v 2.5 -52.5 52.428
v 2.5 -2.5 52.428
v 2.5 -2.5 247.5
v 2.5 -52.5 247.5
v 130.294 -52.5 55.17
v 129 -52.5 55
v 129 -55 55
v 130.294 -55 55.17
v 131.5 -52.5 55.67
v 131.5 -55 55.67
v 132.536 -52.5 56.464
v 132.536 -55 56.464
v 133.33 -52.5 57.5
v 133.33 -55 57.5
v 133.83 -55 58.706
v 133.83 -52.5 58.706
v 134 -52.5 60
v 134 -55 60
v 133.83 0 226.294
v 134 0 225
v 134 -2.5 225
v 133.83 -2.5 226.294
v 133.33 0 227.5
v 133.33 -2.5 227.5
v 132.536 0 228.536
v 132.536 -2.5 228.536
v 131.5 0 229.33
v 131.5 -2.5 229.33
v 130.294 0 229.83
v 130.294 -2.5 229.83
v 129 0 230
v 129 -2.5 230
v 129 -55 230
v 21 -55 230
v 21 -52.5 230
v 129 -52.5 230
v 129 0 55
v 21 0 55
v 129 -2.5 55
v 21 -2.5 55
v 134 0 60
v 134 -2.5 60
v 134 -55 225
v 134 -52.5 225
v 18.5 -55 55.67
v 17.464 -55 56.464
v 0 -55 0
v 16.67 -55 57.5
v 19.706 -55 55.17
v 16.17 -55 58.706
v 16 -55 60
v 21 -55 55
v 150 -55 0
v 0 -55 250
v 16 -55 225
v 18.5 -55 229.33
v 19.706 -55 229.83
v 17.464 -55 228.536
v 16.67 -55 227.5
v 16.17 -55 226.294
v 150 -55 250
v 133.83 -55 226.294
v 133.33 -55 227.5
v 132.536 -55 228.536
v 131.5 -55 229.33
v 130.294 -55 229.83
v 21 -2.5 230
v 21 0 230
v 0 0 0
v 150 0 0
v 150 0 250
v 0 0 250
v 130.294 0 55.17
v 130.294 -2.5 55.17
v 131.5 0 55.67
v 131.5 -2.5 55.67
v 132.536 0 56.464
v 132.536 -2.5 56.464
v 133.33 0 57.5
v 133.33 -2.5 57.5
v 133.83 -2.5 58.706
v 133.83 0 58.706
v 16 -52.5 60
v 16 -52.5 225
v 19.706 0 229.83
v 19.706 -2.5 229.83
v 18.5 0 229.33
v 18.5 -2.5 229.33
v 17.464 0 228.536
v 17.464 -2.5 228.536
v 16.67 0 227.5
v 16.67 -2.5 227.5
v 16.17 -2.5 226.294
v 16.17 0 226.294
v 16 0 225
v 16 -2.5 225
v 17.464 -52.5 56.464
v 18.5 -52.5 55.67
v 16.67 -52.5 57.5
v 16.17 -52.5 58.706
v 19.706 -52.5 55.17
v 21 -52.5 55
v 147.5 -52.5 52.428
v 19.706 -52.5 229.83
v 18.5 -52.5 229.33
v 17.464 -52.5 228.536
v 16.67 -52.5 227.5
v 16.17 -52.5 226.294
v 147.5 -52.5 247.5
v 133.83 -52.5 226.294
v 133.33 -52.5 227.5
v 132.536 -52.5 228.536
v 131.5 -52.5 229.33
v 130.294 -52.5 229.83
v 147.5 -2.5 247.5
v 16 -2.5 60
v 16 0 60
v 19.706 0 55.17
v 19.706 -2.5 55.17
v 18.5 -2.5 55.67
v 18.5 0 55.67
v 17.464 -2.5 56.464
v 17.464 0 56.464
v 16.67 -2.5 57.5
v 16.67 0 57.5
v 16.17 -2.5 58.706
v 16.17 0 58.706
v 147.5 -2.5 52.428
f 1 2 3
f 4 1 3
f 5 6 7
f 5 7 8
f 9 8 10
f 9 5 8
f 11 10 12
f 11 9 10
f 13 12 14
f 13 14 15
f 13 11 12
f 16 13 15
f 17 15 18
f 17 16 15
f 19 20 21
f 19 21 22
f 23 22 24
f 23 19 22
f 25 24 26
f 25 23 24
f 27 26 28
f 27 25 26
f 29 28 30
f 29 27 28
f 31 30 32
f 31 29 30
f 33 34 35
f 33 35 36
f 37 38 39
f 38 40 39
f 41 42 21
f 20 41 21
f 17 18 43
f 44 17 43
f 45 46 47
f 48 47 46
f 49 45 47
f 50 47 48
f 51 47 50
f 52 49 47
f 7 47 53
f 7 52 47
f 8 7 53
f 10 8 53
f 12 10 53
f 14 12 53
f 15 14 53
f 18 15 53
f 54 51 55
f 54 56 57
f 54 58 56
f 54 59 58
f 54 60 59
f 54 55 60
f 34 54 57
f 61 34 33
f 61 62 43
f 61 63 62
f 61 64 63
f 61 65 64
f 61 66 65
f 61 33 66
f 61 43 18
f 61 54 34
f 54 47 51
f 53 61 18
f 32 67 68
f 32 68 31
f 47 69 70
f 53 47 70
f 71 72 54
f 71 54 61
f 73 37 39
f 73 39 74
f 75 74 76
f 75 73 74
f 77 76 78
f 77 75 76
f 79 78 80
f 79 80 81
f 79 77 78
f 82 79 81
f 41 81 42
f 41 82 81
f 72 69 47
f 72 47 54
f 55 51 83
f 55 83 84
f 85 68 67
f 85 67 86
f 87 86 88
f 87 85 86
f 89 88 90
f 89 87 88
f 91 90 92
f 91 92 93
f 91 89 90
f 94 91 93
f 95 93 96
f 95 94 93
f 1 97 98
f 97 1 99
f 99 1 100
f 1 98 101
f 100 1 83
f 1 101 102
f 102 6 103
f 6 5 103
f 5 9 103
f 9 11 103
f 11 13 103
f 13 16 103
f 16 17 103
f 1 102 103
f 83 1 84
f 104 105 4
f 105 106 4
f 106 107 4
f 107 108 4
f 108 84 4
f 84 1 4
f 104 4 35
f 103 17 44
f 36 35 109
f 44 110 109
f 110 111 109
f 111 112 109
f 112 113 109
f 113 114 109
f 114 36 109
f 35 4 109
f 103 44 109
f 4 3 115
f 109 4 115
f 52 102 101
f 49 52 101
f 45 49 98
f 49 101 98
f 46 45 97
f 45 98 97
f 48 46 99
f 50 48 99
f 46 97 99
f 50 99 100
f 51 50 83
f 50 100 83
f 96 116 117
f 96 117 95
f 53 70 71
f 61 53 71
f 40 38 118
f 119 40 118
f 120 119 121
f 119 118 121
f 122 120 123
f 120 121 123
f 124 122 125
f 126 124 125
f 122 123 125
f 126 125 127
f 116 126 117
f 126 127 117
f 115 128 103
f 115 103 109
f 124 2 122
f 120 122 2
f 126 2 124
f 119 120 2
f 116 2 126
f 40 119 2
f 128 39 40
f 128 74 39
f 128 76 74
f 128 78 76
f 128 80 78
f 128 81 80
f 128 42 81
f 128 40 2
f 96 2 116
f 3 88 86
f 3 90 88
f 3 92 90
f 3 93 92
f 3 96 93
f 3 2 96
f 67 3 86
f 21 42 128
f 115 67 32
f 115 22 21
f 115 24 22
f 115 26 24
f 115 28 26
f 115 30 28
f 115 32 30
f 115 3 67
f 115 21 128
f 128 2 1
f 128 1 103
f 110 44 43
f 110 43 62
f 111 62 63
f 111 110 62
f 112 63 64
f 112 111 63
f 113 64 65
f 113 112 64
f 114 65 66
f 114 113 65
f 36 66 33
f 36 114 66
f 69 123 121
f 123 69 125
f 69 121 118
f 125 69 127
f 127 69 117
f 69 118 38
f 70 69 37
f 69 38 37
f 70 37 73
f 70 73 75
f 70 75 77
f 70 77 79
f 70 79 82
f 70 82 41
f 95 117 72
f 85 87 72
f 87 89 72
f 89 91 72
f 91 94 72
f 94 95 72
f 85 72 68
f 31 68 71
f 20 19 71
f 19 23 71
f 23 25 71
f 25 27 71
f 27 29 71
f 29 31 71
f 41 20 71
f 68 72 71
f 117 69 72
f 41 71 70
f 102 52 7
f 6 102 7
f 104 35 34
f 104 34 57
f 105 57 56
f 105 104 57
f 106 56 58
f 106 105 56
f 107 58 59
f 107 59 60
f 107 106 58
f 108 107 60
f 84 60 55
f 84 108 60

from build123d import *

# Parameters (mm, degrees)
F0_W     = 150
F0_H     = 250
F1_DEPTH = 55
F2_W     = 118
F2_H     = 175
F3_DEPTH = 55.001
F4_R     = 5
F5_T     = -2.5
F6_W     = 145
F6_H     = 49.9277314544
F7_DEPTH = 50


with BuildPart() as f1:
    # F0 (on Front) → F1 (new body)
    with BuildSketch(Plane.XZ):
        with Locations((75, 125)):
            Rectangle(F0_W, F0_H)
    extrude(amount=F1_DEPTH)

    # F2 (on face) → F3 (cut, through all)
    with BuildSketch(Plane.XZ.offset(55)):
        with Locations((75, 142.5)):
            Rectangle(F2_W, F2_H)
    extrude(amount=-F3_DEPTH, mode=Mode.SUBTRACT)

    # F4
    f4_edges = [f1.edges().sort_by_distance(p)[0] for p in [
        (16, -27.5, 230),
        (134, -27.5, 230),
        (134, -27.5, 55),
        (16, -27.5, 55),
    ]]
    fillet(f4_edges, radius=F4_R)

    # F5
    f5_openings = [f1.faces().sort_by_distance(p)[0] for p in [
        (16, -27.5, 142.5),
        (17.464466, -27.5, 56.464466),
        (75, -27.5, 55),
        (132.535534, -27.5, 56.464466),
        (134, -27.5, 142.5),
        (17.464466, -27.5, 228.535534),
        (75, -27.5, 230),
        (132.535534, -27.5, 228.535534),
    ]]
    offset(amount=F5_T, openings=f5_openings)

    # F6 (on face) → F7 (join, through all)
    with BuildSketch(Plane.XZ.offset(2.5)):
        with Locations((75, 27.4638657272)):
            Rectangle(F6_W, F6_H)
    extrude(amount=F7_DEPTH)


solid = f1.part
